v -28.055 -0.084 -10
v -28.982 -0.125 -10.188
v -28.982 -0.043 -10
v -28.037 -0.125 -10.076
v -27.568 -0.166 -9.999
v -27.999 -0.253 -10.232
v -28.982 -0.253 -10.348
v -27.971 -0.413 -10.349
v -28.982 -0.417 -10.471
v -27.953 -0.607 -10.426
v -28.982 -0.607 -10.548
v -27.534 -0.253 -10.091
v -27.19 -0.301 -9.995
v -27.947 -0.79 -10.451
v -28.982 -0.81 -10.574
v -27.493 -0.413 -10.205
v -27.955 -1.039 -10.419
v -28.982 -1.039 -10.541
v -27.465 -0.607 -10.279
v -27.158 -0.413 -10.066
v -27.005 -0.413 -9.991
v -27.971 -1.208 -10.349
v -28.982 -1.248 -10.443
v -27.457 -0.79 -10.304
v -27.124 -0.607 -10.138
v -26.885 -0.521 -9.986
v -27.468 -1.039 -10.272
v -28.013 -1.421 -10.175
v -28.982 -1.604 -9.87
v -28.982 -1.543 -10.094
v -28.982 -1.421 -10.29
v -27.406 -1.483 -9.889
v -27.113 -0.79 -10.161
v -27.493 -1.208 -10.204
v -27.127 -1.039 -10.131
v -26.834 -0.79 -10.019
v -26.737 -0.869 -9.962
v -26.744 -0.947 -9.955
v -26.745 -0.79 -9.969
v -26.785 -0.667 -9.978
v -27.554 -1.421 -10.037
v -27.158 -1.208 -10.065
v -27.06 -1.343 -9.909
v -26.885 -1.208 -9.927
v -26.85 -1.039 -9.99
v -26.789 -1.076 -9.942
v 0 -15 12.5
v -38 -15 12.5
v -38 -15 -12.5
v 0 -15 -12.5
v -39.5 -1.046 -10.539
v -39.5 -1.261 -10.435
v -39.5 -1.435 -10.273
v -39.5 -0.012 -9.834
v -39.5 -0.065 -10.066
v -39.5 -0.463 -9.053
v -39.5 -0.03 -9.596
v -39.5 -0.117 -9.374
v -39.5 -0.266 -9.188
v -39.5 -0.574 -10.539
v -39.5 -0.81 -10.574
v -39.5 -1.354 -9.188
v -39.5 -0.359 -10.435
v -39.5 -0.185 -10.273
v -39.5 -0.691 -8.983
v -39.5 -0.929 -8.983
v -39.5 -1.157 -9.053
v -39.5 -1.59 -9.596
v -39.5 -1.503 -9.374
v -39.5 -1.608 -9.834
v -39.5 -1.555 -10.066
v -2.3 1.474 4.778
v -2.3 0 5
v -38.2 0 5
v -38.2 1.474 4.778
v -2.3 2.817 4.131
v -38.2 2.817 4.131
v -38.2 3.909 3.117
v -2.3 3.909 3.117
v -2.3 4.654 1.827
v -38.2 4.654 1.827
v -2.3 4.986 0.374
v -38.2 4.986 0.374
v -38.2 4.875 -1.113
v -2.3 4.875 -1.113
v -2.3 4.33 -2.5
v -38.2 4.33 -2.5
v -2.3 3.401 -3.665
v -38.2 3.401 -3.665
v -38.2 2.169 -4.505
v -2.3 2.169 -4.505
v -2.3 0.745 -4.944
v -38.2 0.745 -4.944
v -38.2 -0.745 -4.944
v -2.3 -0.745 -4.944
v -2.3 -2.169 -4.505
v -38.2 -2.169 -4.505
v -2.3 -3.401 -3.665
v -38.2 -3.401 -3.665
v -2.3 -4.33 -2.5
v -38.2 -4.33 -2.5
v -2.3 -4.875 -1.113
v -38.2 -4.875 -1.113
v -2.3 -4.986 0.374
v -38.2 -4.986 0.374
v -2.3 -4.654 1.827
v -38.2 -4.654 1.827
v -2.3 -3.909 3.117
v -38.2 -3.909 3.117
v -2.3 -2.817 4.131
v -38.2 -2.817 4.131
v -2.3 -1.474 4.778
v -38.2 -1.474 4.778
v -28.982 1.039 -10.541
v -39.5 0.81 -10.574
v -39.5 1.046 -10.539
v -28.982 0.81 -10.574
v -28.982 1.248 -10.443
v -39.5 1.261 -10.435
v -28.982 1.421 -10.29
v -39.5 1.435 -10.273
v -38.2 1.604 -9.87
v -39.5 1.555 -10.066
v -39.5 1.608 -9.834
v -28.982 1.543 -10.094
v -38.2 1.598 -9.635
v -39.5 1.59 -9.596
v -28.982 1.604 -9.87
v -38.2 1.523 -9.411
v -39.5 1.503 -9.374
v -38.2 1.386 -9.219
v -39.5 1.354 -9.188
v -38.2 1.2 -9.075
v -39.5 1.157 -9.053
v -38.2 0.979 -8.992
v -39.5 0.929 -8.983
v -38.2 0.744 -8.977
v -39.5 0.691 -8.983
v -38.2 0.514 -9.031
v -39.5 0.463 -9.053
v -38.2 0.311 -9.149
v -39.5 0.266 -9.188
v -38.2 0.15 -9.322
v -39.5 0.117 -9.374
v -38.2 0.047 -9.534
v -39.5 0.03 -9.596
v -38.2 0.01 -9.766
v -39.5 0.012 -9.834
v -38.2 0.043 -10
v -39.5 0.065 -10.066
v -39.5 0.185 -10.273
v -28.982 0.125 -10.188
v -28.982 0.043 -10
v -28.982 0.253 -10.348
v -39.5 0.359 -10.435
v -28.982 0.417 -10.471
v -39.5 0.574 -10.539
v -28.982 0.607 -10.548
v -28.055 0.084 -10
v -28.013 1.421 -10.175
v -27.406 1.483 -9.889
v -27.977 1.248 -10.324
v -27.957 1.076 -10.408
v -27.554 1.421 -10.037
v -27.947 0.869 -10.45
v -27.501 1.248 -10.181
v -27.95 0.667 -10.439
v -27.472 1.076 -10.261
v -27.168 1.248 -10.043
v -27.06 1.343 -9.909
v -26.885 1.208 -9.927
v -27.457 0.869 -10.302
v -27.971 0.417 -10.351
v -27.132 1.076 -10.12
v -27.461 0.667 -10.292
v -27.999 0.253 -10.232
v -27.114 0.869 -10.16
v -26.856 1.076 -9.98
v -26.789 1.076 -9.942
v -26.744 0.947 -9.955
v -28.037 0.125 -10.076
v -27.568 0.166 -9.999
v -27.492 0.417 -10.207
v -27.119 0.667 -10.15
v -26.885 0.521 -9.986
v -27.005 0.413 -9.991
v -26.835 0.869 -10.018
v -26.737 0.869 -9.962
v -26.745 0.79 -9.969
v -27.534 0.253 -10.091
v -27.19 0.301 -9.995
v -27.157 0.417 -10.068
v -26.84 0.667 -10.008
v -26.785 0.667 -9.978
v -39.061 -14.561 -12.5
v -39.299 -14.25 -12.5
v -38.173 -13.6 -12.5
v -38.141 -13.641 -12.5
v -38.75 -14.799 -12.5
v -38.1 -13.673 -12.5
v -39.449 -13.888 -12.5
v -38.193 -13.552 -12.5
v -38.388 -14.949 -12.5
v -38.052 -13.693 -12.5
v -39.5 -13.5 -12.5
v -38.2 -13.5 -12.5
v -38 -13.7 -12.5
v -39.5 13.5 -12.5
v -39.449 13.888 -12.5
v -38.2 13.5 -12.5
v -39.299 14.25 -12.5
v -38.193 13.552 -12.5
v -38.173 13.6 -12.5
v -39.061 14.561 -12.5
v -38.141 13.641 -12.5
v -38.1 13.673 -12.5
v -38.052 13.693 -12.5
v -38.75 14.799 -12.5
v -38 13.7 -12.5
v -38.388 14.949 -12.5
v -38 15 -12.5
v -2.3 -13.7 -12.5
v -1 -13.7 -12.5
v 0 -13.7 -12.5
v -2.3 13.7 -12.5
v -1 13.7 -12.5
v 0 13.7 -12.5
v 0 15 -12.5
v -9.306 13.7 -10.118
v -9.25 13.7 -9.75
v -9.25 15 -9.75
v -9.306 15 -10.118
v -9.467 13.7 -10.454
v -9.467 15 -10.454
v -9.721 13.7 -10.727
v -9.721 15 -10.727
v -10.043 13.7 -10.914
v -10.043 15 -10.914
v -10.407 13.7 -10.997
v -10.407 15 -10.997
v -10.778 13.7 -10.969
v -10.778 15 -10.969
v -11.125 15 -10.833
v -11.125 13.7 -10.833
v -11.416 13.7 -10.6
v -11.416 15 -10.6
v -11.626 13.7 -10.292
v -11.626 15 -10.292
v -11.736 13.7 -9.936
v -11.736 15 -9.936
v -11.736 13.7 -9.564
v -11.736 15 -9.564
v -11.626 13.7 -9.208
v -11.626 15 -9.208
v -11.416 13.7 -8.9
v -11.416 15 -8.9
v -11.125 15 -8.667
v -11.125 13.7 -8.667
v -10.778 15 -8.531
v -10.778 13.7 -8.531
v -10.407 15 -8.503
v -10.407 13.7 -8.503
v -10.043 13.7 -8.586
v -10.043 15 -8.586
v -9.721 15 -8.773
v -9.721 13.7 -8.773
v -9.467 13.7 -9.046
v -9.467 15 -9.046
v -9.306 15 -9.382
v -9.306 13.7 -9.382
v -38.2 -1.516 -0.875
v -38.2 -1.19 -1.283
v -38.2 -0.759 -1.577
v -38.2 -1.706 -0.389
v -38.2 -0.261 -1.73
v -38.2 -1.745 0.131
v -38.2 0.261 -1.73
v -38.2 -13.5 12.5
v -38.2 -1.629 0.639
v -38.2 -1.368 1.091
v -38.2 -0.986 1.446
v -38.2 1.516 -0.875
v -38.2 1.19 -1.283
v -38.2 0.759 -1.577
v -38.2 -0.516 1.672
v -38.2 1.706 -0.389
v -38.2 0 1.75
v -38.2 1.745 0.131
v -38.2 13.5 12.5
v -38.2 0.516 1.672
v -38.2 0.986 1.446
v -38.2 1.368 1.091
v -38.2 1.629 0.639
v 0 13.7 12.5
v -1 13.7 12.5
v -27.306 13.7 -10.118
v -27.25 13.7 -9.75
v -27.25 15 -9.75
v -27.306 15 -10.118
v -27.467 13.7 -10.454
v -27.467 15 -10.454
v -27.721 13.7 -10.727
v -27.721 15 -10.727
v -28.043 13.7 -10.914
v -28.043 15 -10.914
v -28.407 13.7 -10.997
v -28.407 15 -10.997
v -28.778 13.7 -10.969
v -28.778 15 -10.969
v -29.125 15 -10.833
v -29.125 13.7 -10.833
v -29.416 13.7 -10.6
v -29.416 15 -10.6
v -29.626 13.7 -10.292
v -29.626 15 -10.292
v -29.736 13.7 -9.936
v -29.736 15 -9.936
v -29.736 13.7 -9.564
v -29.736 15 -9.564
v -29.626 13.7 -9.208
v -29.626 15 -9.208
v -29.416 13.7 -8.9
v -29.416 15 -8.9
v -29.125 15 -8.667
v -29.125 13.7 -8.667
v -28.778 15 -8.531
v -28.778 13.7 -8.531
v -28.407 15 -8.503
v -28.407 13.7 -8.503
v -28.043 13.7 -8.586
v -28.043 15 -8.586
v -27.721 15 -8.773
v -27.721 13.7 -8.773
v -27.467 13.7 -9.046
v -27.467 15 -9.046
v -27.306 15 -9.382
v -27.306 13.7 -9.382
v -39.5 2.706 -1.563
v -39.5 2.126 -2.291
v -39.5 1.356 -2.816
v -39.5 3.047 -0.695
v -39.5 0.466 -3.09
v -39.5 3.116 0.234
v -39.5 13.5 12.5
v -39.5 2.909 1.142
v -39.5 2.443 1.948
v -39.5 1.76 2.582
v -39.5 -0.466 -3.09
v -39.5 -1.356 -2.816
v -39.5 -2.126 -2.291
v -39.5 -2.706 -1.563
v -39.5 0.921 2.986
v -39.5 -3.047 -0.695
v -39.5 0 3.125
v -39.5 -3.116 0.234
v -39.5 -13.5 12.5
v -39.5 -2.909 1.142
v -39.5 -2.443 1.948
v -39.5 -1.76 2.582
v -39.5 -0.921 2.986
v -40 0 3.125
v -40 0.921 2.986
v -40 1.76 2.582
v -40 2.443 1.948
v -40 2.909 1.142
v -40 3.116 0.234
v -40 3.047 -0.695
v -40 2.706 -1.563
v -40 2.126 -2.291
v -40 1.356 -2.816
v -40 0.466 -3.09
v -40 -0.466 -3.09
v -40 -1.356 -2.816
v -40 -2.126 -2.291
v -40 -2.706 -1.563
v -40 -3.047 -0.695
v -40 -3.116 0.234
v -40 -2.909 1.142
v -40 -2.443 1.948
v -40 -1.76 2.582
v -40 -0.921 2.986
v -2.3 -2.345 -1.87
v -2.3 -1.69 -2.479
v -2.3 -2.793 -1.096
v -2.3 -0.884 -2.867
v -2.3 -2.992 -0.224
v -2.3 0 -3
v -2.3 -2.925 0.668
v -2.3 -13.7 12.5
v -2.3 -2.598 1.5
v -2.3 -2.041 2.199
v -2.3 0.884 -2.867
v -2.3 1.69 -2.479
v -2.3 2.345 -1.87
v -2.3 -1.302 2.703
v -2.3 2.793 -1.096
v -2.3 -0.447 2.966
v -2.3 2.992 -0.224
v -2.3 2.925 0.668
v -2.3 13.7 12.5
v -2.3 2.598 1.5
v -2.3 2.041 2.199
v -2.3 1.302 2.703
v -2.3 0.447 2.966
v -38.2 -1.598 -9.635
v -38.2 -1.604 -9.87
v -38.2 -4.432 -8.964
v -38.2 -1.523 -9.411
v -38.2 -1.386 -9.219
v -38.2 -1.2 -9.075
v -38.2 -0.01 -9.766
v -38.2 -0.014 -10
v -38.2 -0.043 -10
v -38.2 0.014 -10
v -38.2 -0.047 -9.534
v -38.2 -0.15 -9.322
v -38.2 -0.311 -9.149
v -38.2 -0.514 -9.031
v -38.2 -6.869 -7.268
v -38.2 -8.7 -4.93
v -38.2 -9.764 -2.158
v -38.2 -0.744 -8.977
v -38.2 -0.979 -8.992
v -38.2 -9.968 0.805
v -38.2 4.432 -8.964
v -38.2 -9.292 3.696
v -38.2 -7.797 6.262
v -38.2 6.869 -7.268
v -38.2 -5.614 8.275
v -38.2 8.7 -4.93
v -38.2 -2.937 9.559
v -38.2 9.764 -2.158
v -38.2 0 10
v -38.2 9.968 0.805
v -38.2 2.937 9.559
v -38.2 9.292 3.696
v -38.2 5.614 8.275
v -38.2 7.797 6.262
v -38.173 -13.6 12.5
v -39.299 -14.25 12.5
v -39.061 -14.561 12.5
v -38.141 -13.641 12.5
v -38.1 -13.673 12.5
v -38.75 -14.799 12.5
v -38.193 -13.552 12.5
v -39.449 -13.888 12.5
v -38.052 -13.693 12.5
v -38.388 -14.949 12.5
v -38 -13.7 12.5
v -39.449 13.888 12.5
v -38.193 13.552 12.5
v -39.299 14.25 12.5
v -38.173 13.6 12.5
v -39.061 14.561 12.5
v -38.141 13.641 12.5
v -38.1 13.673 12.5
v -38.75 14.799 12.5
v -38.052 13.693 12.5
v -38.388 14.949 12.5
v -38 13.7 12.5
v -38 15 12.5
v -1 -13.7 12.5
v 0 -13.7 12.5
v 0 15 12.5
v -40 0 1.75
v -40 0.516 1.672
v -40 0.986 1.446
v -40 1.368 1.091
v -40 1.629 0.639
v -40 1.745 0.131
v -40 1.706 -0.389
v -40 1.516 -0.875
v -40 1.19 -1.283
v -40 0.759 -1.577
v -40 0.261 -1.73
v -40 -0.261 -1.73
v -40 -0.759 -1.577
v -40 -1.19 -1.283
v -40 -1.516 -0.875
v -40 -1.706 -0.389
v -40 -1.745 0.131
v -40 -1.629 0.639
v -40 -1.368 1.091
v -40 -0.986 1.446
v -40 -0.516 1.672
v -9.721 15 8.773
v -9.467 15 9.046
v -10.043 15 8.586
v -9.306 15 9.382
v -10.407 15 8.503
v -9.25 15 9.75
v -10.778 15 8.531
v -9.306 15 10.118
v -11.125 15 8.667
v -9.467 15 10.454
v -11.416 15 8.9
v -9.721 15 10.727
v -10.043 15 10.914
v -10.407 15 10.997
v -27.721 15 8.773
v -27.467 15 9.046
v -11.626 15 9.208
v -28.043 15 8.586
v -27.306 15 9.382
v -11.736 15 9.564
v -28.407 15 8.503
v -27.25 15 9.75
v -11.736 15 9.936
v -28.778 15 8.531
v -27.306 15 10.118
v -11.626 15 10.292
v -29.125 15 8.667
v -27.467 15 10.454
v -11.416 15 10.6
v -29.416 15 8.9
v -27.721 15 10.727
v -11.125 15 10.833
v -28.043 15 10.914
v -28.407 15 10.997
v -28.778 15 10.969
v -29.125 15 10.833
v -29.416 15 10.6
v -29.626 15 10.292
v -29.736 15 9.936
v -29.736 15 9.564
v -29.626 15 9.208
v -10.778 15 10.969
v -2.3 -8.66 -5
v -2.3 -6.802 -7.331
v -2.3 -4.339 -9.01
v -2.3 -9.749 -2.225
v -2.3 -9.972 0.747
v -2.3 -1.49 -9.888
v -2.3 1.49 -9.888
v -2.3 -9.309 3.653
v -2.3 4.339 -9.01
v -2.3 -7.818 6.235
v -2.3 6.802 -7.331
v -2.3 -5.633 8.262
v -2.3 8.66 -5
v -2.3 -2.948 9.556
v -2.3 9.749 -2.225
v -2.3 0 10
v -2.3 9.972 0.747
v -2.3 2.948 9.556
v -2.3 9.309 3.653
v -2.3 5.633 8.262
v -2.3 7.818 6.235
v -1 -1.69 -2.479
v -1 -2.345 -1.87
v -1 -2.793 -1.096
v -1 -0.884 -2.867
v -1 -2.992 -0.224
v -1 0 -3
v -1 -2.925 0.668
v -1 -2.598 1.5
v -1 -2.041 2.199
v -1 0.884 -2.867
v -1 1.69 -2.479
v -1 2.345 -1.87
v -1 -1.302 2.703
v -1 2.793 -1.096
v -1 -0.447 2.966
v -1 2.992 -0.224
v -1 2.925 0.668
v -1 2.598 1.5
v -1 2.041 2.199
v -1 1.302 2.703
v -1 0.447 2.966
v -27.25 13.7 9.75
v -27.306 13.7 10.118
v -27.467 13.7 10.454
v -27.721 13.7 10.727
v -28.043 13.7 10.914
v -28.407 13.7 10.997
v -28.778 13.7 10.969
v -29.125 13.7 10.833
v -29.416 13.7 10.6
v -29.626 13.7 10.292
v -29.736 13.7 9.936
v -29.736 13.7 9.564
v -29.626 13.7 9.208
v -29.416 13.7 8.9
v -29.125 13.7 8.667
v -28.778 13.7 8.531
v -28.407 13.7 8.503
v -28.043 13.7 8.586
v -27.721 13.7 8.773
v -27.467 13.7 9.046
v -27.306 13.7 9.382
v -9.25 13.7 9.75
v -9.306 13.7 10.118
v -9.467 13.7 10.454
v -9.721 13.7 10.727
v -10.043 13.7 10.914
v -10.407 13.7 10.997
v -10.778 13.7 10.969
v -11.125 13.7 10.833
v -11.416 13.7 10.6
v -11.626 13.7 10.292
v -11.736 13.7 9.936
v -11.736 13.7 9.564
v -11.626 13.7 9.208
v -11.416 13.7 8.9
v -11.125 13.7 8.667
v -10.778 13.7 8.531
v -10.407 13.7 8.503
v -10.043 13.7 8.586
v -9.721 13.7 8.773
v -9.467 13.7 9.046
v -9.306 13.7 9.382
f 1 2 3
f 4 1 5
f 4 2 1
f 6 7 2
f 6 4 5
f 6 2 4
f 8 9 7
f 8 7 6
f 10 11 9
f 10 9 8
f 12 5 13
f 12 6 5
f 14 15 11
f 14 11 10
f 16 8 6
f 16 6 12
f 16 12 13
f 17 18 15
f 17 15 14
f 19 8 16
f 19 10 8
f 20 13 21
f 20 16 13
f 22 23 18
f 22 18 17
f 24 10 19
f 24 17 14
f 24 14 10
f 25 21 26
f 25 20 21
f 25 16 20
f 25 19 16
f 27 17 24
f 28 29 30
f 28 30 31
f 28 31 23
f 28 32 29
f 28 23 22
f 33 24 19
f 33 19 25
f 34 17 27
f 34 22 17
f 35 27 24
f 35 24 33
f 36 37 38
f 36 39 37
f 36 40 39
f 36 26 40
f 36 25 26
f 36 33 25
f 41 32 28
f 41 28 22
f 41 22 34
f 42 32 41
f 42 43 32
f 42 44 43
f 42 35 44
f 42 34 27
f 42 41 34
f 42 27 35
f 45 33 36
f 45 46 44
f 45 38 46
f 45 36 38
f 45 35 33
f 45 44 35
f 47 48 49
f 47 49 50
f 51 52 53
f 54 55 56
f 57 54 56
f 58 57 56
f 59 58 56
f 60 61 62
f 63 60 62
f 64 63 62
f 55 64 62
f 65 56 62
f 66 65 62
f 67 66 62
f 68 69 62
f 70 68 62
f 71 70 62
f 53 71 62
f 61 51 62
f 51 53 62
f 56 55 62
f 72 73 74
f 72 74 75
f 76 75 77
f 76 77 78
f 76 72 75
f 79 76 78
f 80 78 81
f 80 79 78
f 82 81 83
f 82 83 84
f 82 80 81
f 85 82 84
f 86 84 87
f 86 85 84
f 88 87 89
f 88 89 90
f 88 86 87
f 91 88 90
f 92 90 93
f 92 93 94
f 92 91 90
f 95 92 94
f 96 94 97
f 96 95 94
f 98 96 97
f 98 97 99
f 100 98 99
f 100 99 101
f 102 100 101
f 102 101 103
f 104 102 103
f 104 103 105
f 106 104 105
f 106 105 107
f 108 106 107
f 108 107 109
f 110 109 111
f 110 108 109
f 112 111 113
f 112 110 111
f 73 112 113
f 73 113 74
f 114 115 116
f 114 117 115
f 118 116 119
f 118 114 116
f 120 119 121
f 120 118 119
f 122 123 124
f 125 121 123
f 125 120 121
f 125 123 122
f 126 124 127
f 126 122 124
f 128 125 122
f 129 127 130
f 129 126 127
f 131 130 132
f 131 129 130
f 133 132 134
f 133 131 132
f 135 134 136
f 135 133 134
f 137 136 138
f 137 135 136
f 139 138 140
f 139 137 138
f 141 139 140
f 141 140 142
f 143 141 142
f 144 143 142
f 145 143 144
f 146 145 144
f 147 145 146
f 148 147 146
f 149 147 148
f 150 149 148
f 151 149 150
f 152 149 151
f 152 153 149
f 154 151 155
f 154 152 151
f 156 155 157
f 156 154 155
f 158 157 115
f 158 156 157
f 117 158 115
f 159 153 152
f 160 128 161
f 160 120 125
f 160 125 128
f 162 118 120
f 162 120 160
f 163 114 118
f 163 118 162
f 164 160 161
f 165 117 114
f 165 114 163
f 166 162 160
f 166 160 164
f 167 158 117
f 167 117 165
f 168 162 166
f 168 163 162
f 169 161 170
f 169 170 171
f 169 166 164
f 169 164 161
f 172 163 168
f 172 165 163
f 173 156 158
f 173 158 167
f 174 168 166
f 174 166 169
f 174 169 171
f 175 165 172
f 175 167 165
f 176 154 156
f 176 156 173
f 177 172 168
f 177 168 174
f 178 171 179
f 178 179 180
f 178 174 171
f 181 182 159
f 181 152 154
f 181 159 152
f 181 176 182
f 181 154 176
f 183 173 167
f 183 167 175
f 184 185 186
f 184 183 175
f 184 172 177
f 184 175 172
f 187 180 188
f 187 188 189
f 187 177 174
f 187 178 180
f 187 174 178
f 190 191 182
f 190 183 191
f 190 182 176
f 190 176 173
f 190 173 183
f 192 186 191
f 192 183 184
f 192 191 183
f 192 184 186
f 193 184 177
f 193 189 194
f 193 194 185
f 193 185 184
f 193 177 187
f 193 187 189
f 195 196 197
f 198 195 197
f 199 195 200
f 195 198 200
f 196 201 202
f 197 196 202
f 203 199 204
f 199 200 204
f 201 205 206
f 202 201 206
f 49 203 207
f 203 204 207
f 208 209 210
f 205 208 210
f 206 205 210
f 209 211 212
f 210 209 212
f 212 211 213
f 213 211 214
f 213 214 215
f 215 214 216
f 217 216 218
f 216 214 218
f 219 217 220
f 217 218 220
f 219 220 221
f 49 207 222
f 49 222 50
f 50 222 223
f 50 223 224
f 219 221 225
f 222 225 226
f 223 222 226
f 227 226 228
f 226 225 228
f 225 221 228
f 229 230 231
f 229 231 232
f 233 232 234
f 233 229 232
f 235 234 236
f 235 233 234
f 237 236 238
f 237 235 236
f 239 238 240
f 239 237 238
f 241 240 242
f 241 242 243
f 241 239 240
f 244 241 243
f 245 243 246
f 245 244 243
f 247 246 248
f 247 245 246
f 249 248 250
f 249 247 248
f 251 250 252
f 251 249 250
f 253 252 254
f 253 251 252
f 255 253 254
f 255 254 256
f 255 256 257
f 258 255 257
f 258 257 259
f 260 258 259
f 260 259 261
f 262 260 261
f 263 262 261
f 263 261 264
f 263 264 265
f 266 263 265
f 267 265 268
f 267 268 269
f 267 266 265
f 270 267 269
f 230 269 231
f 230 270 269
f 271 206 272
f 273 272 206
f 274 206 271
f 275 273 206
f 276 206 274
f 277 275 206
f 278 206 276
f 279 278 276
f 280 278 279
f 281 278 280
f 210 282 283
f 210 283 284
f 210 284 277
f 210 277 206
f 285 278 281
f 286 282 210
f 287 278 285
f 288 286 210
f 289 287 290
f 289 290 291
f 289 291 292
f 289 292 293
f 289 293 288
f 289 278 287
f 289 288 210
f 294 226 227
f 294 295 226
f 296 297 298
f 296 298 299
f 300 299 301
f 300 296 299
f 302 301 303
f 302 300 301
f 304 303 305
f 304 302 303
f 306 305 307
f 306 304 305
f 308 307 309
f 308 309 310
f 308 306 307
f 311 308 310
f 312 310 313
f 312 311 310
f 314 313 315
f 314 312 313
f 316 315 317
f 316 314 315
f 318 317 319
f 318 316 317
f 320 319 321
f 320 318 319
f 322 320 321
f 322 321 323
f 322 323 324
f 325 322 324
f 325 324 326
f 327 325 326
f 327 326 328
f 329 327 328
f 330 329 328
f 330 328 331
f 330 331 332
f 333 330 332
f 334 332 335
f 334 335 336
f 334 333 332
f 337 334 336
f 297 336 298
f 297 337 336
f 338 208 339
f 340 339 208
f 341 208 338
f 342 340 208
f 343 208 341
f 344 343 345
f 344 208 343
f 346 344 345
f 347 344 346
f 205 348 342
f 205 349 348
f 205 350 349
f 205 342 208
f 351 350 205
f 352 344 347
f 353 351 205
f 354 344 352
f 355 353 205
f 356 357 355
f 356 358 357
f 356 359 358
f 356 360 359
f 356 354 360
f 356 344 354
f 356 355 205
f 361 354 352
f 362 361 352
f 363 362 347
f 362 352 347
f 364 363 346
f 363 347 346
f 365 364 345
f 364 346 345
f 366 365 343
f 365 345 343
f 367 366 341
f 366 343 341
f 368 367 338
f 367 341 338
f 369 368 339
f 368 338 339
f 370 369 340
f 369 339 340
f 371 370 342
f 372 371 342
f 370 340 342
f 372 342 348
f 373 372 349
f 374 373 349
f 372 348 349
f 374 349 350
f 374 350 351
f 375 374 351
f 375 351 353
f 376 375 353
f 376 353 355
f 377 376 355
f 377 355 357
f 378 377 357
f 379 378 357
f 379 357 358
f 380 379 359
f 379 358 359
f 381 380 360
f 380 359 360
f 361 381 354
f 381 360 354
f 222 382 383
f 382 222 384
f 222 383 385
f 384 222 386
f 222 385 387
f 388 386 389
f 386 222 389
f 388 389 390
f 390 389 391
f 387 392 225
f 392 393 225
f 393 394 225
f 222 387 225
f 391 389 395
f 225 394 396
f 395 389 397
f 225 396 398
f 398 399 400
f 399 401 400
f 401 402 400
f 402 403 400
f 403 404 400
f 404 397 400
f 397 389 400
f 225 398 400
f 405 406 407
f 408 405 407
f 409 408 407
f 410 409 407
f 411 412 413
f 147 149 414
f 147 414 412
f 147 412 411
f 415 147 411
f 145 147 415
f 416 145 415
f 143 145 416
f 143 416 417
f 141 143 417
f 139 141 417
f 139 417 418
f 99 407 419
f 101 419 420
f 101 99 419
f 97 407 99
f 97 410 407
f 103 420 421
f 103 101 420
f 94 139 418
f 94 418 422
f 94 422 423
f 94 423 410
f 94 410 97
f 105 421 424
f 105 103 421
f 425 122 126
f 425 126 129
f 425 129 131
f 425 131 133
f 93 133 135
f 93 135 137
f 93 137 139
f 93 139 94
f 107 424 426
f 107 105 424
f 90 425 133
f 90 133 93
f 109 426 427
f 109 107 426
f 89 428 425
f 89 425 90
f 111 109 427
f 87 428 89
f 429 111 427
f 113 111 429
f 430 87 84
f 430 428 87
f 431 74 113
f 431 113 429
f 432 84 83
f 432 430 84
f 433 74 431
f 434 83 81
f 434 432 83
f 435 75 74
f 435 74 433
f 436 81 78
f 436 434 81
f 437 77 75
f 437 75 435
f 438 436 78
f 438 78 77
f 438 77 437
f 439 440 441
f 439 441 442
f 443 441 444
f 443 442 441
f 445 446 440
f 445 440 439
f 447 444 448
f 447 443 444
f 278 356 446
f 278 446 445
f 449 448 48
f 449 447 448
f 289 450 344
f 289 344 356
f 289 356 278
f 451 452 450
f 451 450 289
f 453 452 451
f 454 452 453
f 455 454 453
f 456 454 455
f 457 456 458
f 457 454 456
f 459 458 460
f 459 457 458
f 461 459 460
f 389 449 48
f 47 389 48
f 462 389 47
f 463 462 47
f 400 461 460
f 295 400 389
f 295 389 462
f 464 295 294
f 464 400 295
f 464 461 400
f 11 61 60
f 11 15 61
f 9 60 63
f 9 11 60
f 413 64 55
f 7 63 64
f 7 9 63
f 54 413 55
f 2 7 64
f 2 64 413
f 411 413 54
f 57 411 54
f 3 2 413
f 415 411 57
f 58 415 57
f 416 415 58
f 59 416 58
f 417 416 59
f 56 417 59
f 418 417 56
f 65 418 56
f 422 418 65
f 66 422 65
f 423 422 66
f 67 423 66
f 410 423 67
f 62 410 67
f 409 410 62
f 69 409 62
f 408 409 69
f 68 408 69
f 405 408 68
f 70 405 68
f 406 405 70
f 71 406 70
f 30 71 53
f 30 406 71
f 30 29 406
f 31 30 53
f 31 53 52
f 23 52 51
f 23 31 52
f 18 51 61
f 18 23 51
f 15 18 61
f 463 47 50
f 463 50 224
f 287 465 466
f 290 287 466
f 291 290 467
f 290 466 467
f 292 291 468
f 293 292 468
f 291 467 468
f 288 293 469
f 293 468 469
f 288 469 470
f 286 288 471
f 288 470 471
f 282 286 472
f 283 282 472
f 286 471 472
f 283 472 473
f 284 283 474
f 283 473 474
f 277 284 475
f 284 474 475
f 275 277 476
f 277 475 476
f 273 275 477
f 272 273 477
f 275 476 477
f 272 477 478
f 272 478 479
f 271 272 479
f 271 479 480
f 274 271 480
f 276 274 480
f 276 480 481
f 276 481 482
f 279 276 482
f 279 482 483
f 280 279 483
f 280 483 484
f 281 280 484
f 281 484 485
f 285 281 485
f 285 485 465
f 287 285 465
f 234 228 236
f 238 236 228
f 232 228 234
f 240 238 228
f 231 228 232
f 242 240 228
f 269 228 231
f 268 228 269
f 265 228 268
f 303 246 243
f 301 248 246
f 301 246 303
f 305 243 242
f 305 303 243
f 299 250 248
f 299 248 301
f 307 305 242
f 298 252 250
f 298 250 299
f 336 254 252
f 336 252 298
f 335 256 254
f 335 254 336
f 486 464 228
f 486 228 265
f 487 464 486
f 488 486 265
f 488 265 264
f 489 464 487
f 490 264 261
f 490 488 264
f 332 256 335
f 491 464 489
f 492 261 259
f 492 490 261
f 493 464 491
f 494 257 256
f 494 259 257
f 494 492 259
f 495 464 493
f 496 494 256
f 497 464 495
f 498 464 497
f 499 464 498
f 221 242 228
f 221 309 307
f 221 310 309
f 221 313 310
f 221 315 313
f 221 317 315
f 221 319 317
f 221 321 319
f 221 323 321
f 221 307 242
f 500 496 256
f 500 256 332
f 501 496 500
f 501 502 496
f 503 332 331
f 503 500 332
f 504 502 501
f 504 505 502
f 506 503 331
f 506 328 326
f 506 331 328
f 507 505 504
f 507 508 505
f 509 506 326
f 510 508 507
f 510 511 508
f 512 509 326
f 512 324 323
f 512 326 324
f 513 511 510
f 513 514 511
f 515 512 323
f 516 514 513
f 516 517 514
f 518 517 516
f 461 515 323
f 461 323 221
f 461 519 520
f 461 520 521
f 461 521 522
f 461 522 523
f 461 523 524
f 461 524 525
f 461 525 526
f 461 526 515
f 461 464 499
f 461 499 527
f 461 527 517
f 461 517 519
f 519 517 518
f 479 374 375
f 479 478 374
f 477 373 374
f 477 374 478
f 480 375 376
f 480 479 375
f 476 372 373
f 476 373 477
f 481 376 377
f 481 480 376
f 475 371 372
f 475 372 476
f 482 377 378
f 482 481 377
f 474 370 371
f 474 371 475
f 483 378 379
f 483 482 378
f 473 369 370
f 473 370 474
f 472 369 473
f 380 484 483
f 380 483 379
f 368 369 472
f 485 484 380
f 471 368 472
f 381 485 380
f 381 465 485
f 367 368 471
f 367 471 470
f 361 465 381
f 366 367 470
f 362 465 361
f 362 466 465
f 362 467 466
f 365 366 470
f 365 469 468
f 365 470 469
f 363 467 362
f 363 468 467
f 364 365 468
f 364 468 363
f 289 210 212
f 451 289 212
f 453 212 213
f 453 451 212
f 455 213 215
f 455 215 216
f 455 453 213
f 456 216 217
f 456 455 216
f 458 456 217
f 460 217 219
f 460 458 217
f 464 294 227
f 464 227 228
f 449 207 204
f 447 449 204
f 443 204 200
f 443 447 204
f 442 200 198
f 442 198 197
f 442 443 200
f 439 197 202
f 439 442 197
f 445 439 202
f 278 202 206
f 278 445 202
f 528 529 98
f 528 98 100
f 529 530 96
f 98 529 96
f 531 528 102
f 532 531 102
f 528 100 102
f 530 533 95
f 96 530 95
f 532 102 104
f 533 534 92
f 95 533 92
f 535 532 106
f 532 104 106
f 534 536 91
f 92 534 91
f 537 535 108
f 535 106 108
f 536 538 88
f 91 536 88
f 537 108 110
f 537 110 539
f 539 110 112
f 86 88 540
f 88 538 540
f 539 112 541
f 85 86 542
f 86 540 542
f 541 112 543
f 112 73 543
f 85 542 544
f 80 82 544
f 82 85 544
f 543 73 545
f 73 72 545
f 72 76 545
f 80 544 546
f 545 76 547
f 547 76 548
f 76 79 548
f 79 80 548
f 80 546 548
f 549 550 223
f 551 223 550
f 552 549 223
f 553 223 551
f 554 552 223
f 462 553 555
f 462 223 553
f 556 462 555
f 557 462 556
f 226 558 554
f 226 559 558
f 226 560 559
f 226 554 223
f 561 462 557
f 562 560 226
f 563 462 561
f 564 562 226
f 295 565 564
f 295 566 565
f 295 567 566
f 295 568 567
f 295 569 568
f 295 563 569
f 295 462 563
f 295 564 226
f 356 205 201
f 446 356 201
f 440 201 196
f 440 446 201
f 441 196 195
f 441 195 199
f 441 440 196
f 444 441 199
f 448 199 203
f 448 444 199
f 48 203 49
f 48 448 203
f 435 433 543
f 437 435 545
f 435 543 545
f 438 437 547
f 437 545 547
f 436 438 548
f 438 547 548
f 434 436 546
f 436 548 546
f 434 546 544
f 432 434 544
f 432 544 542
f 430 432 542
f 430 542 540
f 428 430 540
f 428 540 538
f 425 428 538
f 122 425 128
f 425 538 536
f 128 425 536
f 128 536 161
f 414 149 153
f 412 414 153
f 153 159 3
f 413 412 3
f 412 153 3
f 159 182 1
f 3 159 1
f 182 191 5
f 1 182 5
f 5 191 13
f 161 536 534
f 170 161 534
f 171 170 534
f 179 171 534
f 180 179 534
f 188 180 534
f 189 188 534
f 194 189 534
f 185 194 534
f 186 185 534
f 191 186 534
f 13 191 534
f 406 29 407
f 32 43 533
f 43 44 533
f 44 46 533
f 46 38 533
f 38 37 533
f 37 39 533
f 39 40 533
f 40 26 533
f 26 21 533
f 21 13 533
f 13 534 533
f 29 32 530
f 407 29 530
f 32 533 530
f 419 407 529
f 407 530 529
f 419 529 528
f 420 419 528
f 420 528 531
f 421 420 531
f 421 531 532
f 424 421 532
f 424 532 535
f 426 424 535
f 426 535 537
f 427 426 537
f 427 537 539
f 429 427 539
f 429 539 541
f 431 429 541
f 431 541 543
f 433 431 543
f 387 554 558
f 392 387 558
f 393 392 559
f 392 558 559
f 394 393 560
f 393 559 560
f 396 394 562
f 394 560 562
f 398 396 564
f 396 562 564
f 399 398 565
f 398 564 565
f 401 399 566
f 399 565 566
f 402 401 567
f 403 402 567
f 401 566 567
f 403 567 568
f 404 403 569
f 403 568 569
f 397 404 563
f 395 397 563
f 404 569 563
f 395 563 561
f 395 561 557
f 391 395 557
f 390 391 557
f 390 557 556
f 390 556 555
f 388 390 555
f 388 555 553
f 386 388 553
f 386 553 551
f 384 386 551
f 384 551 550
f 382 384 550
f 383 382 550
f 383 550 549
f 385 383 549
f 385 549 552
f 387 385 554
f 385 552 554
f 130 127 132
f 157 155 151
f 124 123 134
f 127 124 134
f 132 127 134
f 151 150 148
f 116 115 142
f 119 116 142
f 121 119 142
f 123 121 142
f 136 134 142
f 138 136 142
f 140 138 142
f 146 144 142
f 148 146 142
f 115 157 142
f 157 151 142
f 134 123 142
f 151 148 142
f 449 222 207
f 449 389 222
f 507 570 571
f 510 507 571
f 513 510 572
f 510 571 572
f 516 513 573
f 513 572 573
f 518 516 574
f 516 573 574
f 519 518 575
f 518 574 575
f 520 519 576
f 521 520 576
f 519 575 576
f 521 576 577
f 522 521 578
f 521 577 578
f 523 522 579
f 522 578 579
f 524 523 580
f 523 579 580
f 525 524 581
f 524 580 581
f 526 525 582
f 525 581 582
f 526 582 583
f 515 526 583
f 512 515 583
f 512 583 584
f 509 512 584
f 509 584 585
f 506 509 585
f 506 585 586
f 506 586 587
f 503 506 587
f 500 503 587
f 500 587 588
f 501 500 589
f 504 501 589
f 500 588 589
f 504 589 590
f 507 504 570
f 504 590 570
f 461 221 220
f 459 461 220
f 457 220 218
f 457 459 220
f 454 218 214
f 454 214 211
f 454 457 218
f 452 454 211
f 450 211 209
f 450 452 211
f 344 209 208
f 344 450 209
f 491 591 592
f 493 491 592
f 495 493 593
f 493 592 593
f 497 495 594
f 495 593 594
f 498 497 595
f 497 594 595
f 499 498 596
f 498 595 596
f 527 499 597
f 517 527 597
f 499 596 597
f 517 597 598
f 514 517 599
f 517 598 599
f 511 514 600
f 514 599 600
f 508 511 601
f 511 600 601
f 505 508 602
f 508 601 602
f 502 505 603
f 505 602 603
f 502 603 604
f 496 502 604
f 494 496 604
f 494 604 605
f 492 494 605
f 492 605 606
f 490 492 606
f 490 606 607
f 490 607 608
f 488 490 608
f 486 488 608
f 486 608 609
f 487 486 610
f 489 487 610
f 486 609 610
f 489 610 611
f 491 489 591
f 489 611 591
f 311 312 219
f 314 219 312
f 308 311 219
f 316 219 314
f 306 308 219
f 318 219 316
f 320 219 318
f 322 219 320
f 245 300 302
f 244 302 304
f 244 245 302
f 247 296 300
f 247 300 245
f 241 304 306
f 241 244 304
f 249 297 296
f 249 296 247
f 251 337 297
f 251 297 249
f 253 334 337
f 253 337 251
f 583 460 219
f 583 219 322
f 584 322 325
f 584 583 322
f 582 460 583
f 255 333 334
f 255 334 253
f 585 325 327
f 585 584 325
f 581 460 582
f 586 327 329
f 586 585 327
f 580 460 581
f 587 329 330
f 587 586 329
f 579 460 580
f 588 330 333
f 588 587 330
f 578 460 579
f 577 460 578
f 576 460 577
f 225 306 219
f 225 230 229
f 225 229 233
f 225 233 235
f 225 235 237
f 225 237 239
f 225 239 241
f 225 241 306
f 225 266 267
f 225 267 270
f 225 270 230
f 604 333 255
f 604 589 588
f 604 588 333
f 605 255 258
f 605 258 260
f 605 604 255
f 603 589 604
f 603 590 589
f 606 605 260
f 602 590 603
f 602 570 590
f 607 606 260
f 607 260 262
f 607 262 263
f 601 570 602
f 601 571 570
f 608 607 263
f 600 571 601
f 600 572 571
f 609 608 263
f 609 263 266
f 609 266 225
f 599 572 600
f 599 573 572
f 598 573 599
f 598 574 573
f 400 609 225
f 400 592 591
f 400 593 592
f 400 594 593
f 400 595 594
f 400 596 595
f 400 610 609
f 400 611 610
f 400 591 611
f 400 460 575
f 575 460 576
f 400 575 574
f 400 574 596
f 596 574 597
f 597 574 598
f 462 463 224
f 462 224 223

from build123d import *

# Parameters (mm, degrees)
SKETCH1_W                     = 1.3
SKETCH1_H                     = 27.4
HOUSING_DEPTH                 = 12.5
SKETCH2_R                     = 3.125
END_BOSS_DEPTH                = 0.5
SMALL_BORE_REACH              = 46.511
SKETCH3_R                     = 1.75
SKETCH4_R                     = 10
SKETCH4_R_2                   = 5
COIL_DEPTH                    = 35.9
SKETCH5_R                     = 3
LARGE_BORE_DEPTH              = 1.3
M3X0_5_START                  = 13.7
M3X0_5_TAPPED_HOLE1_OUTLINE_R = 1.25
M3X0_5_TAPPED_HOLE1_DEPTH     = 1.3
SKETCH11_R                    = 0.8


# Read off the part's stored shape, not the designer's step: M3x0.5 Tapped Hole1
with BuildPart() as part:
    # Sketch1 → Housing (new, symmetric)
    with BuildSketch(Plane.XY):
        with BuildLine():
            Line((-38.2, -13.5), (-38.2, 13.5))
            ThreePointArc((-38.2, 13.5), (-38.141421356, 13.641421356), (-38, 13.7))
            Line((-38, 13.7), (0, 13.7))
            Line((0, 13.7), (0, 15))
            Line((0, 15), (-38, 15))
            ThreePointArc((-38, 15), (-39.060660172, 14.560660172), (-39.5, 13.5))
            Line((-39.5, 13.5), (-39.5, -13.5))
            ThreePointArc((-39.5, -13.5), (-39.060660172, -14.560660172), (-38, -15))
            Line((-38, -15), (0, -15))
            Line((0, -15), (0, -13.7))
            Line((0, -13.7), (-38, -13.7))
            ThreePointArc((-38, -13.7), (-38.141421356, -13.641421356), (-38.2, -13.5))
        make_face()
        with Locations((-1.65, 0)):
            Rectangle(SKETCH1_W, SKETCH1_H)
    extrude(amount=HOUSING_DEPTH, both=True)

    # Sketch2 → End Boss (add)
    with BuildSketch(Plane.ZY.offset(39.5)):
        Circle(SKETCH2_R)
    extrude(amount=END_BOSS_DEPTH)

    # Sketch3 → Small Bore (cut, up to next)
    with BuildSketch(Plane.ZY.offset(40), mode=Mode.PRIVATE) as small_bore_sk1:
        Circle(SKETCH3_R)
    small_bore_tool1 = extrude(small_bore_sk1.sketch, amount=-SMALL_BORE_REACH, mode=Mode.PRIVATE) & part.part
    add(small_bore_tool1.solids().sort_by_distance((-40, 0, 0))[0], mode=Mode.SUBTRACT)

    # Sketch5 → Large Bore (cut)
    with BuildSketch(Plane(origin=(-1, 0, 0), x_dir=(0, 0, -1), z_dir=(1, 0, 0))):
        Circle(SKETCH5_R)
    extrude(amount=-LARGE_BORE_DEPTH, mode=Mode.SUBTRACT)

    # M3x0.5 Tapped Hole1 outline → M3x0.5 Tapped Hole1 (cut)
    with BuildSketch(Plane(origin=(0, 0, 0), x_dir=(1, 0, 0), z_dir=(0, 1, 0)).offset(M3X0_5_START)):
        with Locations((-28.5, 9.75)):
            Circle(M3X0_5_TAPPED_HOLE1_OUTLINE_R)
        with Locations((-10.5, 9.75)):
            Circle(M3X0_5_TAPPED_HOLE1_OUTLINE_R)
    m3x0_5_tapped_hole1 = extrude(amount=M3X0_5_TAPPED_HOLE1_DEPTH, mode=Mode.SUBTRACT)

    # Mirror1: M3x0.5 Tapped Hole1 across plane
    add(m3x0_5_tapped_hole1.mirror(Plane.XY), mode=Mode.SUBTRACT)


with BuildPart() as body_2:
    # Sketch4 → Coil (new body)
    with BuildSketch(Plane.ZY.offset(2.3)):
        Circle(SKETCH4_R)
        Circle(SKETCH4_R_2, mode=Mode.SUBTRACT)
    extrude(amount=COIL_DEPTH)

    # Wires 2: sweep along a path in Sketch12
    with BuildLine(Plane(origin=(0, 0, 0), x_dir=(1, 0, 0), z_dir=(0, 1, 0))) as wires_2_path:
        Line((-39.5, 9.774082389), (-28.981684691, 9.774082389))
        ThreePointArc((-28.981684691, 9.774082389), (-27.383714597, 9.404319945), (-26.110595638, 8.370201575))
        Line((-26.110595638, 8.370201575), (-24.934313388, 6.858404062))
    # Sketch11 → Wires 2 (sweep)
    with BuildSketch(Plane(origin=(-39.5, 0, 0), x_dir=(0, 0, -1), z_dir=(1, 0, 0))):
        with Locations((9.774082389, 0.81)):
            Circle(SKETCH11_R)
        with Locations((9.774082389, -0.81)):
            Circle(SKETCH11_R)
    sweep(path=wires_2_path.line)


solid = Compound([part.part, body_2.part])
